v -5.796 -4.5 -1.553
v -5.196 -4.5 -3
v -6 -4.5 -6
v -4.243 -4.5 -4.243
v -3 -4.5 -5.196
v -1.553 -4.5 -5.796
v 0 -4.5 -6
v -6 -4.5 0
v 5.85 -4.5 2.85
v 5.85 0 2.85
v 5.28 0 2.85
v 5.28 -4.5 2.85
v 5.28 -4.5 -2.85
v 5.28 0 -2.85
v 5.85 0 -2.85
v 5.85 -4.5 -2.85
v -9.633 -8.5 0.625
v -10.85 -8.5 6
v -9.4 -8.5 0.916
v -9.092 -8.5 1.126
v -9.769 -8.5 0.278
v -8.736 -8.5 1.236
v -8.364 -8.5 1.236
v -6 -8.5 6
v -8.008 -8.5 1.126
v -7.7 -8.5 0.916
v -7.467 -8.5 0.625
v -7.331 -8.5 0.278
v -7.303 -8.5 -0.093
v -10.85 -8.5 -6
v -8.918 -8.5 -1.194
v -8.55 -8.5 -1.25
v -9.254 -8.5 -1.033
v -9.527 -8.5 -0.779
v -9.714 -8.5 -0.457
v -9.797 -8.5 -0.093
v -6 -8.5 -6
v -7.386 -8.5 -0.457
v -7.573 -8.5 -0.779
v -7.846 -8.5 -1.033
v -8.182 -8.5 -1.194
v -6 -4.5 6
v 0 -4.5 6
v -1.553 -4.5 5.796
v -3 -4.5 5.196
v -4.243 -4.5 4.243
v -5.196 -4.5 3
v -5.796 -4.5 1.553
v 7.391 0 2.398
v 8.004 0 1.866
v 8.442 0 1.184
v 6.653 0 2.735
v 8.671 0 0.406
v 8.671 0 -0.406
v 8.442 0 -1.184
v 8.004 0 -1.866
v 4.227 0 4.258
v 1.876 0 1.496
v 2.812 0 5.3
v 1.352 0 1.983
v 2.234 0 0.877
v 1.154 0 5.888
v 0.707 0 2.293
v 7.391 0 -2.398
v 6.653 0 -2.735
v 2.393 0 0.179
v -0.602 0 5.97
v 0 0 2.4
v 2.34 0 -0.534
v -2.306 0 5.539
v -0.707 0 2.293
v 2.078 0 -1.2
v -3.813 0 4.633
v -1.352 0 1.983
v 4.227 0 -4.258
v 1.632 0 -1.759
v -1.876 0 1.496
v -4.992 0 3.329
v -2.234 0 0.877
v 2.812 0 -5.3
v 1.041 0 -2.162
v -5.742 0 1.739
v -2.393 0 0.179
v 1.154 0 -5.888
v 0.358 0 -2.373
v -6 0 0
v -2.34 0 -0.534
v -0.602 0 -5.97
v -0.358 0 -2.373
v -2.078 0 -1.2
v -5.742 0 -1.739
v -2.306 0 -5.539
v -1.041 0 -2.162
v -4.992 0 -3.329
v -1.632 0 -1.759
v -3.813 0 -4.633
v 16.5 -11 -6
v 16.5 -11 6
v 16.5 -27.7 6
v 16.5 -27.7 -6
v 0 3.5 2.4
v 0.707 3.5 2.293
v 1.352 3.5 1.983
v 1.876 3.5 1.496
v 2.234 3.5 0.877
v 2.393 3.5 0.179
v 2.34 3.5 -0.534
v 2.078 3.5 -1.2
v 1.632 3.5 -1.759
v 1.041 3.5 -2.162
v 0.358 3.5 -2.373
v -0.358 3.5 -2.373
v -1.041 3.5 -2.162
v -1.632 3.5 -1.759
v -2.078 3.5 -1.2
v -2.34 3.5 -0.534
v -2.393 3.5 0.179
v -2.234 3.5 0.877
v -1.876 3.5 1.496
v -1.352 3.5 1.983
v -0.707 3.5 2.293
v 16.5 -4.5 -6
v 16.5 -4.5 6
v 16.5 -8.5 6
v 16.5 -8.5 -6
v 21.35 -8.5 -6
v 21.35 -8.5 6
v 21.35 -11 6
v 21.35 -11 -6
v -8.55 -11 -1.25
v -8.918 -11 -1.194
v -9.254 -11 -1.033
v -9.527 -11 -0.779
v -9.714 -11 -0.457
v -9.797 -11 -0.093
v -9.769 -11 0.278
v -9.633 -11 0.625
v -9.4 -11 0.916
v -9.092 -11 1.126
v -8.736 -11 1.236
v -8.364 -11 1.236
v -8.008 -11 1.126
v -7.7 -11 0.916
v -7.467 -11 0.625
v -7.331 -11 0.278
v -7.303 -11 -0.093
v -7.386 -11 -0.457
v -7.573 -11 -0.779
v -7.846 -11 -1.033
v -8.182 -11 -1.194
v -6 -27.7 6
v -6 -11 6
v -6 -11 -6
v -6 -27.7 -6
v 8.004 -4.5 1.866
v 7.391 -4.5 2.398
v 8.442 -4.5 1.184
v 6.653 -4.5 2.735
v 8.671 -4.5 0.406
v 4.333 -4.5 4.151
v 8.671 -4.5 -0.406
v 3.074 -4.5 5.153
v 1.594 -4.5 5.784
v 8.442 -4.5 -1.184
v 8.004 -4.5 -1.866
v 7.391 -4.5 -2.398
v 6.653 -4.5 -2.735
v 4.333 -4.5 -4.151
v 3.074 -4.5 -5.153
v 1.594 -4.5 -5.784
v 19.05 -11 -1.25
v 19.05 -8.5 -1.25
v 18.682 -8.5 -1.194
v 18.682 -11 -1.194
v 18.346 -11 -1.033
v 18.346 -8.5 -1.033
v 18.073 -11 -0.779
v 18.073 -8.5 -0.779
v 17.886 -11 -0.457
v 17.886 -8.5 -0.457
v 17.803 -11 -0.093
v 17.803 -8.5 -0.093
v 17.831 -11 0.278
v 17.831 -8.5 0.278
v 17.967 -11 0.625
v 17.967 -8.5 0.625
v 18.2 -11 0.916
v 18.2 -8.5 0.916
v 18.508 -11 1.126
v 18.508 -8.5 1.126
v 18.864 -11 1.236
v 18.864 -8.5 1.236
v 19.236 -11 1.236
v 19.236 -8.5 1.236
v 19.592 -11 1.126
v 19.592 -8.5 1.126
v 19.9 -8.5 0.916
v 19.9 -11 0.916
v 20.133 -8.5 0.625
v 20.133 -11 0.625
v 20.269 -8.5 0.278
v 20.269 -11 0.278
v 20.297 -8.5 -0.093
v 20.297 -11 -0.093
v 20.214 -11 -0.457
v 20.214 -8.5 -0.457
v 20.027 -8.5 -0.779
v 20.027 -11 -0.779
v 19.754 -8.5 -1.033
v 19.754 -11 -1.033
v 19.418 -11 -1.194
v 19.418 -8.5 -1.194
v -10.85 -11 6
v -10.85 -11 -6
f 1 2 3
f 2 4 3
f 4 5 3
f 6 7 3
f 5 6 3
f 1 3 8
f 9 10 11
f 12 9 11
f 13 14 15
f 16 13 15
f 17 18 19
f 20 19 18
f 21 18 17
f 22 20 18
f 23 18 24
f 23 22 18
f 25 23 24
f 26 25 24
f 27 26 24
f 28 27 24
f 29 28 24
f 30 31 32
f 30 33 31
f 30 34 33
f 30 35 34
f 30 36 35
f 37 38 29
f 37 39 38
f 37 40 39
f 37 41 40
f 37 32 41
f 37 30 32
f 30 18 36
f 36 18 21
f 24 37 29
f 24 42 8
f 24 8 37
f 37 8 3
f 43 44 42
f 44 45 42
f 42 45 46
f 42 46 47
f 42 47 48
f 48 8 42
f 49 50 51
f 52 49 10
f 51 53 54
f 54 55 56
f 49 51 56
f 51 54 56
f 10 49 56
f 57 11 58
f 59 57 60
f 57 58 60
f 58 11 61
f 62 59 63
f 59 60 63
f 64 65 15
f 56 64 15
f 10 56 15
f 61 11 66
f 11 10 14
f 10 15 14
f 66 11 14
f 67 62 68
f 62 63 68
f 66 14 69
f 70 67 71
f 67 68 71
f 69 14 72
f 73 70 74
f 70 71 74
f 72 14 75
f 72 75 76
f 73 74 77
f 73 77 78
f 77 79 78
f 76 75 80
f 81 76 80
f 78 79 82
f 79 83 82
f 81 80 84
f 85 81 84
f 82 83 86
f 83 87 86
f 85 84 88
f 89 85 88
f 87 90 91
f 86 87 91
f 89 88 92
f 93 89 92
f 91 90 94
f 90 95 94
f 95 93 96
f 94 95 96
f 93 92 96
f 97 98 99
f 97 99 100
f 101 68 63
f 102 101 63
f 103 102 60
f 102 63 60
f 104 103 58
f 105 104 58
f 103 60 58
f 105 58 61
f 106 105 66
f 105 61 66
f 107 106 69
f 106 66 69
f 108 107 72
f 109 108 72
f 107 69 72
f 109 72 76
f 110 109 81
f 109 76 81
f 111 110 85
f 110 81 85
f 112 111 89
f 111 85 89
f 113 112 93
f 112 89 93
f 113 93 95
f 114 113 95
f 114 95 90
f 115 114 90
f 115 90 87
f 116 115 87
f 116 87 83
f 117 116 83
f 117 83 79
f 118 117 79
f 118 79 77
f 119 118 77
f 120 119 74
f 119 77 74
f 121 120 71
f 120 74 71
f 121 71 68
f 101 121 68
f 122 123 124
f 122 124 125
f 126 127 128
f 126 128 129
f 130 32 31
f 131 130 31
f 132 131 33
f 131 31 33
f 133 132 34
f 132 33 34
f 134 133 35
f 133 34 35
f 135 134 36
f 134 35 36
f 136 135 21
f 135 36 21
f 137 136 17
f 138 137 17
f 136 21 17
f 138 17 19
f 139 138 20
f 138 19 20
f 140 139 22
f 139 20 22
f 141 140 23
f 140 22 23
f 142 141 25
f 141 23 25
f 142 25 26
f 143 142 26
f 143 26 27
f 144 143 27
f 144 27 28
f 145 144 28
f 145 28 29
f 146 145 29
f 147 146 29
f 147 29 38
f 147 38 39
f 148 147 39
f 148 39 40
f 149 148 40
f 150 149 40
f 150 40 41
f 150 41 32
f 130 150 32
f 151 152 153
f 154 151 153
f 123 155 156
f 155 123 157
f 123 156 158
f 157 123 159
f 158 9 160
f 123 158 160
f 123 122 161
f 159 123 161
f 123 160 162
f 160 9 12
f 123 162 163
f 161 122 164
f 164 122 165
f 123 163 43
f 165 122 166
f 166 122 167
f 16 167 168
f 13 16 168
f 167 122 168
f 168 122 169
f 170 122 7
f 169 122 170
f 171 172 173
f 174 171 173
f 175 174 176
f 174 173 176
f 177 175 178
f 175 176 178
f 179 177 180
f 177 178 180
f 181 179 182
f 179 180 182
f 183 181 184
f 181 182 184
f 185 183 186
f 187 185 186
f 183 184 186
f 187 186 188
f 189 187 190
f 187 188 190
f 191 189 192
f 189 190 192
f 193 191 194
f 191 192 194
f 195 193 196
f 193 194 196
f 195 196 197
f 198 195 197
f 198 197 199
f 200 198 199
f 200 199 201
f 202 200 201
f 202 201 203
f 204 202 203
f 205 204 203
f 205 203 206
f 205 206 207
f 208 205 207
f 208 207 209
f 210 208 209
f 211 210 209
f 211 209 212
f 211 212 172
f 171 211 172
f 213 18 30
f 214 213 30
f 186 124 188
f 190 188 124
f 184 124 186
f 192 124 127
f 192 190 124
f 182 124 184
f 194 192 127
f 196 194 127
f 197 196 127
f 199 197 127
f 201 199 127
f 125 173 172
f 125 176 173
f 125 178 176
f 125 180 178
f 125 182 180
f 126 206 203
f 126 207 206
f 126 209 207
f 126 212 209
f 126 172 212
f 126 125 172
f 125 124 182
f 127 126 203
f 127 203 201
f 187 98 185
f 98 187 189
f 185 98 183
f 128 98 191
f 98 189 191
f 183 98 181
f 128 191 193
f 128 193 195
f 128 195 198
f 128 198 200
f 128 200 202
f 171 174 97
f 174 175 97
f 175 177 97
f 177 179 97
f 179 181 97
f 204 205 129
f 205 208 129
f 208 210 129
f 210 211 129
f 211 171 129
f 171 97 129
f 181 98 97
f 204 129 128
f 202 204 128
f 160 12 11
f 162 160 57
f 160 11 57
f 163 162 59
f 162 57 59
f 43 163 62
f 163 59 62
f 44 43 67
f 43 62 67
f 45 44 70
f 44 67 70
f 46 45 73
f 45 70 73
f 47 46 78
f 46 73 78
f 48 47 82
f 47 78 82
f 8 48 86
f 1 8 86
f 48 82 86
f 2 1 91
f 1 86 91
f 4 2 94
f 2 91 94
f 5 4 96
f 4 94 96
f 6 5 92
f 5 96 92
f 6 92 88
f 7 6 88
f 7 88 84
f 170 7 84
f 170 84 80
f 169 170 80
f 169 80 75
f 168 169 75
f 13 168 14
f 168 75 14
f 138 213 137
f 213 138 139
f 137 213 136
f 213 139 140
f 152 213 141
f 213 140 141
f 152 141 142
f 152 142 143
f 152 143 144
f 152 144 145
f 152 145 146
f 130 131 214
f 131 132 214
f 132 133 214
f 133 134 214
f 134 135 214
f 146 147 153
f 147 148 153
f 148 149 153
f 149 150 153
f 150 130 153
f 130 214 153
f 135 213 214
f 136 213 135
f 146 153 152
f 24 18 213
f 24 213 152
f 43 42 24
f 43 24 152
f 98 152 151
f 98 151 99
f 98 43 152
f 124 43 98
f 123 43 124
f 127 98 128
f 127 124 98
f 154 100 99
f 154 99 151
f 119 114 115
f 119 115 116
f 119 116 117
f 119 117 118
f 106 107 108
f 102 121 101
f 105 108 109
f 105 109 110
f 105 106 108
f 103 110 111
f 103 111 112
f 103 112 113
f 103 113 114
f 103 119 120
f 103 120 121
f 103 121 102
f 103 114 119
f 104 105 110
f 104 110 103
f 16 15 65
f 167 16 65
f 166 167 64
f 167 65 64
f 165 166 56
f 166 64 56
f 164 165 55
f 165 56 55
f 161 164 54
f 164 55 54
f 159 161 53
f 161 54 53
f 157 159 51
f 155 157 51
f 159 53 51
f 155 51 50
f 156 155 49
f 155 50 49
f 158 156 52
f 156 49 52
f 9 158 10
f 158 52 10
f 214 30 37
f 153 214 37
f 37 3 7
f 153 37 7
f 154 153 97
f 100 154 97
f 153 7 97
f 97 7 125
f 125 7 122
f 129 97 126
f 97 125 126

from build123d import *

# Parameters (mm, degrees)
SKETCH1_R          = 2.4
EXTRUDE_269_DEPTH  = 3.5
EXTRUDE_450_DEPTH  = 4.5
SKETCH3_W          = 22.5
SKETCH3_H          = 12
EXTRUDE_686_DEPTH  = 23.2
SKETCH4_W          = 32.2
SKETCH4_H          = 12
EXTRUDE_857_DEPTH  = 2.5
SKETCH5_R          = 1.25
CUT_EXTRUDE1_DEPTH = 36.483975256


with BuildPart() as part:
    # Sketch1 → Extrude 269 (new body)
    with BuildSketch(Plane(origin=(0, 0, 0), x_dir=(1, 0, 0), z_dir=(0, 1, 0))):
        with Locations(Location((0, 0, 0), (0, 0, 270))):
            Circle(SKETCH1_R)
    extrude(amount=EXTRUDE_269_DEPTH)

    # Sketch2 → Extrude 450 (add)
    with BuildSketch(Plane(origin=(0, 0, 0), x_dir=(1, 0, 0), z_dir=(0, 1, 0))):
        with BuildLine():
            Line((5.85, -2.85), (5.279914772, -2.85))
            ThreePointArc((5.279914772, -2.85), (-6, 0), (5.279914772, 2.85))
            Line((5.279914772, 2.85), (5.85, 2.85))
            ThreePointArc((5.85, 2.85), (8.7, 0), (5.85, -2.85))
        make_face()
    extrude(amount=-EXTRUDE_450_DEPTH)

    # Sketch3 → Extrude 686 (add)
    with BuildSketch(Plane(origin=(0, -4.5, 0), x_dir=(-1, 0, 0), z_dir=(0, -1, 0))):
        with Locations((-5.25, 0)):
            Rectangle(SKETCH3_W, SKETCH3_H)
    extrude(amount=EXTRUDE_686_DEPTH)

    # Sketch4 → Extrude 857 (add)
    with BuildSketch(Plane(origin=(0, -8.5, 0), x_dir=(1, 0, 0), z_dir=(0, 1, 0))):
        with Locations((5.25, 0)):
            Rectangle(SKETCH4_W, SKETCH4_H)
    extrude(amount=-EXTRUDE_857_DEPTH)

    # Sketch5 → Cut-Extrude1 (cut, through all)
    with BuildSketch(Plane(origin=(0, 0, 0), x_dir=(1, 0, 0), z_dir=(0, 1, 0))):
        with Locations(Location((-8.55, 0, 0), (0, 0, 90))):
            Circle(SKETCH5_R)
        with Locations(Location((19.05, 0, 0), (0, 0, 90))):
            Circle(SKETCH5_R)
    extrude(amount=-CUT_EXTRUDE1_DEPTH, mode=Mode.SUBTRACT)


solid = part.part
